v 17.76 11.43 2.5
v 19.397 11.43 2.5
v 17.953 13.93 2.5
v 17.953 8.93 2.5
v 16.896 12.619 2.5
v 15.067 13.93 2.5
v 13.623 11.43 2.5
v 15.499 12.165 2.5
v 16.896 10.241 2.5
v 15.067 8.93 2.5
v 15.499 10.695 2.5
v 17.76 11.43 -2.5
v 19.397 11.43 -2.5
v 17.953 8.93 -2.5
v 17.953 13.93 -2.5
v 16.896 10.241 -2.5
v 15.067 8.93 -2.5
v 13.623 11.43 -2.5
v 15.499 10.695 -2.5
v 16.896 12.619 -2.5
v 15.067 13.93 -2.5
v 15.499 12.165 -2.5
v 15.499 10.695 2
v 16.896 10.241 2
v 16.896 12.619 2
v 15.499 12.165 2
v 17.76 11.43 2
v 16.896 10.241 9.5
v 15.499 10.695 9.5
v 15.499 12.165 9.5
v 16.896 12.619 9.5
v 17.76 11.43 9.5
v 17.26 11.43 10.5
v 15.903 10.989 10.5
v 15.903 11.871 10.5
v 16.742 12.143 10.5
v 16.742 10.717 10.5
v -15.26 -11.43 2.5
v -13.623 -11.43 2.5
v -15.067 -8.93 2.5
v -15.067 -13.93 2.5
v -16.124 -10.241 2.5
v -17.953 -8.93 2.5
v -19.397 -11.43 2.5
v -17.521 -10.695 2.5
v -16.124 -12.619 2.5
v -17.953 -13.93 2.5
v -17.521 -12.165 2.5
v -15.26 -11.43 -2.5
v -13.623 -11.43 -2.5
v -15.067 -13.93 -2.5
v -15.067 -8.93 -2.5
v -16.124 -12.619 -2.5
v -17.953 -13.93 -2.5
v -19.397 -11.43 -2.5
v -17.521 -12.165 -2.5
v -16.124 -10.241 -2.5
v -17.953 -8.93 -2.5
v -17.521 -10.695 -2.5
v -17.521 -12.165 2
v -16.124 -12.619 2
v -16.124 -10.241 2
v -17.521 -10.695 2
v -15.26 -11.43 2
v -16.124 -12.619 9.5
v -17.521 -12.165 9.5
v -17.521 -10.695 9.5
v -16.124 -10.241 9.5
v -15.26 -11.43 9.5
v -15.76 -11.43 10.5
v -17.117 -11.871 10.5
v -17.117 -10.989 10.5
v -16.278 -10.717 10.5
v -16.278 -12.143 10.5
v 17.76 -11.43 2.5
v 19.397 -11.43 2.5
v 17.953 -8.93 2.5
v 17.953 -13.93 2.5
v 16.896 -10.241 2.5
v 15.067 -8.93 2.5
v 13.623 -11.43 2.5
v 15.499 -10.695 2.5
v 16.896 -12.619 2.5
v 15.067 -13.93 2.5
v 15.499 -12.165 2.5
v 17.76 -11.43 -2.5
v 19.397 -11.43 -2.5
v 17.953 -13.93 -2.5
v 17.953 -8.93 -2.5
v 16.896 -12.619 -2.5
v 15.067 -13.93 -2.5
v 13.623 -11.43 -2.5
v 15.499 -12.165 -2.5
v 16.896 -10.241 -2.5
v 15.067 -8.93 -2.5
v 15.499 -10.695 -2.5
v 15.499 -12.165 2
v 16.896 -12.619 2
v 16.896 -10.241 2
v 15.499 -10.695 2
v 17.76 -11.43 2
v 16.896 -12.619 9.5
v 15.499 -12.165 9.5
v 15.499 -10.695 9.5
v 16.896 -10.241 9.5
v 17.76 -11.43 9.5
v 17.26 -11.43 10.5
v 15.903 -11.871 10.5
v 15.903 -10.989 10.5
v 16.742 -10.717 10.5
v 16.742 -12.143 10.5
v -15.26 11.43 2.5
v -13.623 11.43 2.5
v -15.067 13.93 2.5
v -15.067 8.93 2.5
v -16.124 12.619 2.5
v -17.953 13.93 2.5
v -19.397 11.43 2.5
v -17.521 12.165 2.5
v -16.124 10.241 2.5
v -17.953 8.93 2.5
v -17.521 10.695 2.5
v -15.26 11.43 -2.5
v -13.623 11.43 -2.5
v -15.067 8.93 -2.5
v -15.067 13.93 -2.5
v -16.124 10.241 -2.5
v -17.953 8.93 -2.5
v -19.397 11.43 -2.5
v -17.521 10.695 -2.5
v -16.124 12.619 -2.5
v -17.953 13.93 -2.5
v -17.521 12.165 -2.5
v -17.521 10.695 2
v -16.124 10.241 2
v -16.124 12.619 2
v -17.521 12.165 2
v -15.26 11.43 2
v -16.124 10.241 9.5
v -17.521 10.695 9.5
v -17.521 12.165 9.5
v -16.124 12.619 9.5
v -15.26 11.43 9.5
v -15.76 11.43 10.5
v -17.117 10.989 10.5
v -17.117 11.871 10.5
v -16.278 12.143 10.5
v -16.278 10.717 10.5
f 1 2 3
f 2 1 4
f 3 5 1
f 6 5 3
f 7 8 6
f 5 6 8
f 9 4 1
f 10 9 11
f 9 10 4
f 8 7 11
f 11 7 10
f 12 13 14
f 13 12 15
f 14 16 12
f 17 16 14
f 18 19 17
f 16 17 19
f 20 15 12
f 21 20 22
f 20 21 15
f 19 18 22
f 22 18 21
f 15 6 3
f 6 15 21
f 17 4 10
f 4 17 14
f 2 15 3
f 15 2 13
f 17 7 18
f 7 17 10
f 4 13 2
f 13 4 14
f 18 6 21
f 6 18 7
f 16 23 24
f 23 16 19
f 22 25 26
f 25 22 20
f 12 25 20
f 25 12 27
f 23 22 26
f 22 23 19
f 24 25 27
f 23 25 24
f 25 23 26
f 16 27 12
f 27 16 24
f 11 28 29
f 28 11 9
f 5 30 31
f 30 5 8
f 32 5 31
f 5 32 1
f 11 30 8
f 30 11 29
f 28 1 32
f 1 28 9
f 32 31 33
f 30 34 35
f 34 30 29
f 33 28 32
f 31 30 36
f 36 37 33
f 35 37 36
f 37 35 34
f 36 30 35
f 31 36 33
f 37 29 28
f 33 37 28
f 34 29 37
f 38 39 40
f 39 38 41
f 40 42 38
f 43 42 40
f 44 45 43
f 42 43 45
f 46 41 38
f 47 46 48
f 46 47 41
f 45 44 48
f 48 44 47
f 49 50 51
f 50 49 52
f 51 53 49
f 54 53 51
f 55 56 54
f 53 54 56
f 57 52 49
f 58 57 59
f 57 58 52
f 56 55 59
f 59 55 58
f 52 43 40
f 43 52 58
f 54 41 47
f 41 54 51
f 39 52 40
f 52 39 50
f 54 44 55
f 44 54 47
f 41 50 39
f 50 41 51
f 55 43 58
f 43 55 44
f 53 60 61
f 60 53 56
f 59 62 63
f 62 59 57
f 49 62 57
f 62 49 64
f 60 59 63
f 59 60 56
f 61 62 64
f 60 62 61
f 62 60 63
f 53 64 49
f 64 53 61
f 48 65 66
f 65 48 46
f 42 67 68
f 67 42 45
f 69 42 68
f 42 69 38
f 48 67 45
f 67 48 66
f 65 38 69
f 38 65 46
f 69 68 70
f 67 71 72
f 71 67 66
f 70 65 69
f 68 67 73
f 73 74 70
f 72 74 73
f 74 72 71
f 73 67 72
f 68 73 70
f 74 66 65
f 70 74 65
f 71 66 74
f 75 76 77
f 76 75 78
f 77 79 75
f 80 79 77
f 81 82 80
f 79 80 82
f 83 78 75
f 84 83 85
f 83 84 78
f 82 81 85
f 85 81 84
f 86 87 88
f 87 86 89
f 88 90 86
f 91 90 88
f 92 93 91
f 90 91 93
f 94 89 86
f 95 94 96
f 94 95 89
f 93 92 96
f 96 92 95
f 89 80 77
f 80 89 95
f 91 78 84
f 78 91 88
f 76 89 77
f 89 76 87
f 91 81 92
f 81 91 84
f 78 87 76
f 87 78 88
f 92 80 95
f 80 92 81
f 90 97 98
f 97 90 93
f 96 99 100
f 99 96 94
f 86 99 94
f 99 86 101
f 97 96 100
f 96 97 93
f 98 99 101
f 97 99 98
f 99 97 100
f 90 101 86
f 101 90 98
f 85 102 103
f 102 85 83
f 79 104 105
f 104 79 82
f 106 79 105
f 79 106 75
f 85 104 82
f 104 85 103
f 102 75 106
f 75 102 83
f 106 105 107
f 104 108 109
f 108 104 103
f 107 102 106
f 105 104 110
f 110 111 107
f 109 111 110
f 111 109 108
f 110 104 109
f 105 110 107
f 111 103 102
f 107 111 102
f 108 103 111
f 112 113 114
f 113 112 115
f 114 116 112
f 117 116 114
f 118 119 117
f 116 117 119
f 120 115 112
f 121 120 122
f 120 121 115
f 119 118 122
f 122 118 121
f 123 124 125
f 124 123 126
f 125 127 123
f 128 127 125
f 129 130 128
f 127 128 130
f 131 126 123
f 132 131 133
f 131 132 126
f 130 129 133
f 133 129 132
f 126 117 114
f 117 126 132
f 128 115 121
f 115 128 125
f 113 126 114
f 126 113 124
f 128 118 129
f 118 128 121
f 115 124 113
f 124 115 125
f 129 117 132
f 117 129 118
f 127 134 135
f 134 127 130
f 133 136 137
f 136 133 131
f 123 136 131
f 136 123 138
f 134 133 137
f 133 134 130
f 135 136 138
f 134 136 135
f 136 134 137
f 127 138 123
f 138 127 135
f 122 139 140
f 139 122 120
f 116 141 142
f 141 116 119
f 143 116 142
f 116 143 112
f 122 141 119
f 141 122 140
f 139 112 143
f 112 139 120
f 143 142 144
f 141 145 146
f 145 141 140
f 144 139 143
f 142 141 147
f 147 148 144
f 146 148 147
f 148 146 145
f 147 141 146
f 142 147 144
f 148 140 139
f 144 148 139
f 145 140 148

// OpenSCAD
// file: dim1.scad
//L'objet de ce fichier est de consigner les dimensions et les contraintes communes aux trois pieces de la e-poignee.
//Ces trois pieces sont fabriquees sur imprimante 3D, elles sont completees d'un Circuit Imprime (CI) et d'un isolateur.
//Le montage de l'ensemble est realise à l'aide d'un jeu de visserie compose
//de vis, de rondelles, d'un ecrou autobloquant et d'entretoises filetees.
//Les noms attribues a ces trois pieces sont la jupe, le top et le logo.
//Les dimensions relatives au CI sont exprimees en pouces et converties en mm à l'aide d'un Coefficient de Conversion (CC).
CC=25.4;//Coefficient de Conversion (pouce -> mm)
L1=1.6*CC;//longueur du CI
L2=1.3*CC;//entre axes des trous de fixation du CI
l1=1.2*CC;//largeur du CI
l2=0.9*CC;//entre axes des trous de fixation du CI
r=(0.125*CC)/2;//rayon de percage des trous de fixation du CI
e=0.1*CC;//epaisseur des parois
R=37.15;//Rayon du cercle de revolution du tore
//La premiere contrainte commune au logo et au top est la visibilite de l'embase USB.
//Cette visibilite est necessaire quand l'utilisateur etablit la connection du cable sur l'embase USB.
//La seconde contrainte est thermique, la temperature du couvercle peut atteindre des valeurs aux environ des 90°C.
//L'experience a montree que la matiere (PLA ou ABS) ramolie a ces temperatures.
//Cette contrainte est prise en compte par l'insertion de l'isolateur, elle concerne egalement la perimetre inferieur de la jupe.

//---------------CHANGEMENT DE CI = CONSERVATION DES VALEURS POUR LA JUPE-------------------
x1=2.25*CC;//entre axes des trous de fixation du CI
y1=0.8*CC;//entre axes des trous de fixation du CI
// main file
//$fn=100;
include<dim1.scad>
//Module Entretoise
module ent_M(M,l1_e,l2_e, x, xt, yt)
//M comme métrique (diamètre de la partie filetée)
//l1_e est la longueur de la partie hexagonale femelle
//l2_e est la longueur de la partie male
//x est le quotient du rayon r par la tangente 60°
{r=x/tan(60);
translate([xt,yt,0]){
difference(){
union(){
rotate([0,0,0])cube(size = [r,x,l1_e], center = true);
rotate([0,0,-60])cube(size = [r,x,l1_e], center = true);
rotate([0,0,-120])cube(size = [r,x,l1_e], center = true);
}//union
translate([0,0,-l2_e/4])cylinder(h = l2_e, r1 = M/2, r2 = M/2, center = true);//filetage femelle
}//difference
translate([0,0,((l1_e/2)+(l2_e/2))-0.5])cylinder(h = l2_e-1, r1 = M/2, r2 = M/2, center = true);
translate([0,0,((l1_e/2)+(l2_e))-0.5])cylinder(h = 1, r1 = M/2, r2 = (M/2)-0.5, center = true);
}//translate
}//module
ent_M(2.5,5,8,5,L2/2,l2/2);
ent_M(2.5,5,8,5,-L2/2,-l2/2);
ent_M(2.5,5,8,5,L2/2,-l2/2);
ent_M(2.5,5,8,5,-L2/2,l2/2);
